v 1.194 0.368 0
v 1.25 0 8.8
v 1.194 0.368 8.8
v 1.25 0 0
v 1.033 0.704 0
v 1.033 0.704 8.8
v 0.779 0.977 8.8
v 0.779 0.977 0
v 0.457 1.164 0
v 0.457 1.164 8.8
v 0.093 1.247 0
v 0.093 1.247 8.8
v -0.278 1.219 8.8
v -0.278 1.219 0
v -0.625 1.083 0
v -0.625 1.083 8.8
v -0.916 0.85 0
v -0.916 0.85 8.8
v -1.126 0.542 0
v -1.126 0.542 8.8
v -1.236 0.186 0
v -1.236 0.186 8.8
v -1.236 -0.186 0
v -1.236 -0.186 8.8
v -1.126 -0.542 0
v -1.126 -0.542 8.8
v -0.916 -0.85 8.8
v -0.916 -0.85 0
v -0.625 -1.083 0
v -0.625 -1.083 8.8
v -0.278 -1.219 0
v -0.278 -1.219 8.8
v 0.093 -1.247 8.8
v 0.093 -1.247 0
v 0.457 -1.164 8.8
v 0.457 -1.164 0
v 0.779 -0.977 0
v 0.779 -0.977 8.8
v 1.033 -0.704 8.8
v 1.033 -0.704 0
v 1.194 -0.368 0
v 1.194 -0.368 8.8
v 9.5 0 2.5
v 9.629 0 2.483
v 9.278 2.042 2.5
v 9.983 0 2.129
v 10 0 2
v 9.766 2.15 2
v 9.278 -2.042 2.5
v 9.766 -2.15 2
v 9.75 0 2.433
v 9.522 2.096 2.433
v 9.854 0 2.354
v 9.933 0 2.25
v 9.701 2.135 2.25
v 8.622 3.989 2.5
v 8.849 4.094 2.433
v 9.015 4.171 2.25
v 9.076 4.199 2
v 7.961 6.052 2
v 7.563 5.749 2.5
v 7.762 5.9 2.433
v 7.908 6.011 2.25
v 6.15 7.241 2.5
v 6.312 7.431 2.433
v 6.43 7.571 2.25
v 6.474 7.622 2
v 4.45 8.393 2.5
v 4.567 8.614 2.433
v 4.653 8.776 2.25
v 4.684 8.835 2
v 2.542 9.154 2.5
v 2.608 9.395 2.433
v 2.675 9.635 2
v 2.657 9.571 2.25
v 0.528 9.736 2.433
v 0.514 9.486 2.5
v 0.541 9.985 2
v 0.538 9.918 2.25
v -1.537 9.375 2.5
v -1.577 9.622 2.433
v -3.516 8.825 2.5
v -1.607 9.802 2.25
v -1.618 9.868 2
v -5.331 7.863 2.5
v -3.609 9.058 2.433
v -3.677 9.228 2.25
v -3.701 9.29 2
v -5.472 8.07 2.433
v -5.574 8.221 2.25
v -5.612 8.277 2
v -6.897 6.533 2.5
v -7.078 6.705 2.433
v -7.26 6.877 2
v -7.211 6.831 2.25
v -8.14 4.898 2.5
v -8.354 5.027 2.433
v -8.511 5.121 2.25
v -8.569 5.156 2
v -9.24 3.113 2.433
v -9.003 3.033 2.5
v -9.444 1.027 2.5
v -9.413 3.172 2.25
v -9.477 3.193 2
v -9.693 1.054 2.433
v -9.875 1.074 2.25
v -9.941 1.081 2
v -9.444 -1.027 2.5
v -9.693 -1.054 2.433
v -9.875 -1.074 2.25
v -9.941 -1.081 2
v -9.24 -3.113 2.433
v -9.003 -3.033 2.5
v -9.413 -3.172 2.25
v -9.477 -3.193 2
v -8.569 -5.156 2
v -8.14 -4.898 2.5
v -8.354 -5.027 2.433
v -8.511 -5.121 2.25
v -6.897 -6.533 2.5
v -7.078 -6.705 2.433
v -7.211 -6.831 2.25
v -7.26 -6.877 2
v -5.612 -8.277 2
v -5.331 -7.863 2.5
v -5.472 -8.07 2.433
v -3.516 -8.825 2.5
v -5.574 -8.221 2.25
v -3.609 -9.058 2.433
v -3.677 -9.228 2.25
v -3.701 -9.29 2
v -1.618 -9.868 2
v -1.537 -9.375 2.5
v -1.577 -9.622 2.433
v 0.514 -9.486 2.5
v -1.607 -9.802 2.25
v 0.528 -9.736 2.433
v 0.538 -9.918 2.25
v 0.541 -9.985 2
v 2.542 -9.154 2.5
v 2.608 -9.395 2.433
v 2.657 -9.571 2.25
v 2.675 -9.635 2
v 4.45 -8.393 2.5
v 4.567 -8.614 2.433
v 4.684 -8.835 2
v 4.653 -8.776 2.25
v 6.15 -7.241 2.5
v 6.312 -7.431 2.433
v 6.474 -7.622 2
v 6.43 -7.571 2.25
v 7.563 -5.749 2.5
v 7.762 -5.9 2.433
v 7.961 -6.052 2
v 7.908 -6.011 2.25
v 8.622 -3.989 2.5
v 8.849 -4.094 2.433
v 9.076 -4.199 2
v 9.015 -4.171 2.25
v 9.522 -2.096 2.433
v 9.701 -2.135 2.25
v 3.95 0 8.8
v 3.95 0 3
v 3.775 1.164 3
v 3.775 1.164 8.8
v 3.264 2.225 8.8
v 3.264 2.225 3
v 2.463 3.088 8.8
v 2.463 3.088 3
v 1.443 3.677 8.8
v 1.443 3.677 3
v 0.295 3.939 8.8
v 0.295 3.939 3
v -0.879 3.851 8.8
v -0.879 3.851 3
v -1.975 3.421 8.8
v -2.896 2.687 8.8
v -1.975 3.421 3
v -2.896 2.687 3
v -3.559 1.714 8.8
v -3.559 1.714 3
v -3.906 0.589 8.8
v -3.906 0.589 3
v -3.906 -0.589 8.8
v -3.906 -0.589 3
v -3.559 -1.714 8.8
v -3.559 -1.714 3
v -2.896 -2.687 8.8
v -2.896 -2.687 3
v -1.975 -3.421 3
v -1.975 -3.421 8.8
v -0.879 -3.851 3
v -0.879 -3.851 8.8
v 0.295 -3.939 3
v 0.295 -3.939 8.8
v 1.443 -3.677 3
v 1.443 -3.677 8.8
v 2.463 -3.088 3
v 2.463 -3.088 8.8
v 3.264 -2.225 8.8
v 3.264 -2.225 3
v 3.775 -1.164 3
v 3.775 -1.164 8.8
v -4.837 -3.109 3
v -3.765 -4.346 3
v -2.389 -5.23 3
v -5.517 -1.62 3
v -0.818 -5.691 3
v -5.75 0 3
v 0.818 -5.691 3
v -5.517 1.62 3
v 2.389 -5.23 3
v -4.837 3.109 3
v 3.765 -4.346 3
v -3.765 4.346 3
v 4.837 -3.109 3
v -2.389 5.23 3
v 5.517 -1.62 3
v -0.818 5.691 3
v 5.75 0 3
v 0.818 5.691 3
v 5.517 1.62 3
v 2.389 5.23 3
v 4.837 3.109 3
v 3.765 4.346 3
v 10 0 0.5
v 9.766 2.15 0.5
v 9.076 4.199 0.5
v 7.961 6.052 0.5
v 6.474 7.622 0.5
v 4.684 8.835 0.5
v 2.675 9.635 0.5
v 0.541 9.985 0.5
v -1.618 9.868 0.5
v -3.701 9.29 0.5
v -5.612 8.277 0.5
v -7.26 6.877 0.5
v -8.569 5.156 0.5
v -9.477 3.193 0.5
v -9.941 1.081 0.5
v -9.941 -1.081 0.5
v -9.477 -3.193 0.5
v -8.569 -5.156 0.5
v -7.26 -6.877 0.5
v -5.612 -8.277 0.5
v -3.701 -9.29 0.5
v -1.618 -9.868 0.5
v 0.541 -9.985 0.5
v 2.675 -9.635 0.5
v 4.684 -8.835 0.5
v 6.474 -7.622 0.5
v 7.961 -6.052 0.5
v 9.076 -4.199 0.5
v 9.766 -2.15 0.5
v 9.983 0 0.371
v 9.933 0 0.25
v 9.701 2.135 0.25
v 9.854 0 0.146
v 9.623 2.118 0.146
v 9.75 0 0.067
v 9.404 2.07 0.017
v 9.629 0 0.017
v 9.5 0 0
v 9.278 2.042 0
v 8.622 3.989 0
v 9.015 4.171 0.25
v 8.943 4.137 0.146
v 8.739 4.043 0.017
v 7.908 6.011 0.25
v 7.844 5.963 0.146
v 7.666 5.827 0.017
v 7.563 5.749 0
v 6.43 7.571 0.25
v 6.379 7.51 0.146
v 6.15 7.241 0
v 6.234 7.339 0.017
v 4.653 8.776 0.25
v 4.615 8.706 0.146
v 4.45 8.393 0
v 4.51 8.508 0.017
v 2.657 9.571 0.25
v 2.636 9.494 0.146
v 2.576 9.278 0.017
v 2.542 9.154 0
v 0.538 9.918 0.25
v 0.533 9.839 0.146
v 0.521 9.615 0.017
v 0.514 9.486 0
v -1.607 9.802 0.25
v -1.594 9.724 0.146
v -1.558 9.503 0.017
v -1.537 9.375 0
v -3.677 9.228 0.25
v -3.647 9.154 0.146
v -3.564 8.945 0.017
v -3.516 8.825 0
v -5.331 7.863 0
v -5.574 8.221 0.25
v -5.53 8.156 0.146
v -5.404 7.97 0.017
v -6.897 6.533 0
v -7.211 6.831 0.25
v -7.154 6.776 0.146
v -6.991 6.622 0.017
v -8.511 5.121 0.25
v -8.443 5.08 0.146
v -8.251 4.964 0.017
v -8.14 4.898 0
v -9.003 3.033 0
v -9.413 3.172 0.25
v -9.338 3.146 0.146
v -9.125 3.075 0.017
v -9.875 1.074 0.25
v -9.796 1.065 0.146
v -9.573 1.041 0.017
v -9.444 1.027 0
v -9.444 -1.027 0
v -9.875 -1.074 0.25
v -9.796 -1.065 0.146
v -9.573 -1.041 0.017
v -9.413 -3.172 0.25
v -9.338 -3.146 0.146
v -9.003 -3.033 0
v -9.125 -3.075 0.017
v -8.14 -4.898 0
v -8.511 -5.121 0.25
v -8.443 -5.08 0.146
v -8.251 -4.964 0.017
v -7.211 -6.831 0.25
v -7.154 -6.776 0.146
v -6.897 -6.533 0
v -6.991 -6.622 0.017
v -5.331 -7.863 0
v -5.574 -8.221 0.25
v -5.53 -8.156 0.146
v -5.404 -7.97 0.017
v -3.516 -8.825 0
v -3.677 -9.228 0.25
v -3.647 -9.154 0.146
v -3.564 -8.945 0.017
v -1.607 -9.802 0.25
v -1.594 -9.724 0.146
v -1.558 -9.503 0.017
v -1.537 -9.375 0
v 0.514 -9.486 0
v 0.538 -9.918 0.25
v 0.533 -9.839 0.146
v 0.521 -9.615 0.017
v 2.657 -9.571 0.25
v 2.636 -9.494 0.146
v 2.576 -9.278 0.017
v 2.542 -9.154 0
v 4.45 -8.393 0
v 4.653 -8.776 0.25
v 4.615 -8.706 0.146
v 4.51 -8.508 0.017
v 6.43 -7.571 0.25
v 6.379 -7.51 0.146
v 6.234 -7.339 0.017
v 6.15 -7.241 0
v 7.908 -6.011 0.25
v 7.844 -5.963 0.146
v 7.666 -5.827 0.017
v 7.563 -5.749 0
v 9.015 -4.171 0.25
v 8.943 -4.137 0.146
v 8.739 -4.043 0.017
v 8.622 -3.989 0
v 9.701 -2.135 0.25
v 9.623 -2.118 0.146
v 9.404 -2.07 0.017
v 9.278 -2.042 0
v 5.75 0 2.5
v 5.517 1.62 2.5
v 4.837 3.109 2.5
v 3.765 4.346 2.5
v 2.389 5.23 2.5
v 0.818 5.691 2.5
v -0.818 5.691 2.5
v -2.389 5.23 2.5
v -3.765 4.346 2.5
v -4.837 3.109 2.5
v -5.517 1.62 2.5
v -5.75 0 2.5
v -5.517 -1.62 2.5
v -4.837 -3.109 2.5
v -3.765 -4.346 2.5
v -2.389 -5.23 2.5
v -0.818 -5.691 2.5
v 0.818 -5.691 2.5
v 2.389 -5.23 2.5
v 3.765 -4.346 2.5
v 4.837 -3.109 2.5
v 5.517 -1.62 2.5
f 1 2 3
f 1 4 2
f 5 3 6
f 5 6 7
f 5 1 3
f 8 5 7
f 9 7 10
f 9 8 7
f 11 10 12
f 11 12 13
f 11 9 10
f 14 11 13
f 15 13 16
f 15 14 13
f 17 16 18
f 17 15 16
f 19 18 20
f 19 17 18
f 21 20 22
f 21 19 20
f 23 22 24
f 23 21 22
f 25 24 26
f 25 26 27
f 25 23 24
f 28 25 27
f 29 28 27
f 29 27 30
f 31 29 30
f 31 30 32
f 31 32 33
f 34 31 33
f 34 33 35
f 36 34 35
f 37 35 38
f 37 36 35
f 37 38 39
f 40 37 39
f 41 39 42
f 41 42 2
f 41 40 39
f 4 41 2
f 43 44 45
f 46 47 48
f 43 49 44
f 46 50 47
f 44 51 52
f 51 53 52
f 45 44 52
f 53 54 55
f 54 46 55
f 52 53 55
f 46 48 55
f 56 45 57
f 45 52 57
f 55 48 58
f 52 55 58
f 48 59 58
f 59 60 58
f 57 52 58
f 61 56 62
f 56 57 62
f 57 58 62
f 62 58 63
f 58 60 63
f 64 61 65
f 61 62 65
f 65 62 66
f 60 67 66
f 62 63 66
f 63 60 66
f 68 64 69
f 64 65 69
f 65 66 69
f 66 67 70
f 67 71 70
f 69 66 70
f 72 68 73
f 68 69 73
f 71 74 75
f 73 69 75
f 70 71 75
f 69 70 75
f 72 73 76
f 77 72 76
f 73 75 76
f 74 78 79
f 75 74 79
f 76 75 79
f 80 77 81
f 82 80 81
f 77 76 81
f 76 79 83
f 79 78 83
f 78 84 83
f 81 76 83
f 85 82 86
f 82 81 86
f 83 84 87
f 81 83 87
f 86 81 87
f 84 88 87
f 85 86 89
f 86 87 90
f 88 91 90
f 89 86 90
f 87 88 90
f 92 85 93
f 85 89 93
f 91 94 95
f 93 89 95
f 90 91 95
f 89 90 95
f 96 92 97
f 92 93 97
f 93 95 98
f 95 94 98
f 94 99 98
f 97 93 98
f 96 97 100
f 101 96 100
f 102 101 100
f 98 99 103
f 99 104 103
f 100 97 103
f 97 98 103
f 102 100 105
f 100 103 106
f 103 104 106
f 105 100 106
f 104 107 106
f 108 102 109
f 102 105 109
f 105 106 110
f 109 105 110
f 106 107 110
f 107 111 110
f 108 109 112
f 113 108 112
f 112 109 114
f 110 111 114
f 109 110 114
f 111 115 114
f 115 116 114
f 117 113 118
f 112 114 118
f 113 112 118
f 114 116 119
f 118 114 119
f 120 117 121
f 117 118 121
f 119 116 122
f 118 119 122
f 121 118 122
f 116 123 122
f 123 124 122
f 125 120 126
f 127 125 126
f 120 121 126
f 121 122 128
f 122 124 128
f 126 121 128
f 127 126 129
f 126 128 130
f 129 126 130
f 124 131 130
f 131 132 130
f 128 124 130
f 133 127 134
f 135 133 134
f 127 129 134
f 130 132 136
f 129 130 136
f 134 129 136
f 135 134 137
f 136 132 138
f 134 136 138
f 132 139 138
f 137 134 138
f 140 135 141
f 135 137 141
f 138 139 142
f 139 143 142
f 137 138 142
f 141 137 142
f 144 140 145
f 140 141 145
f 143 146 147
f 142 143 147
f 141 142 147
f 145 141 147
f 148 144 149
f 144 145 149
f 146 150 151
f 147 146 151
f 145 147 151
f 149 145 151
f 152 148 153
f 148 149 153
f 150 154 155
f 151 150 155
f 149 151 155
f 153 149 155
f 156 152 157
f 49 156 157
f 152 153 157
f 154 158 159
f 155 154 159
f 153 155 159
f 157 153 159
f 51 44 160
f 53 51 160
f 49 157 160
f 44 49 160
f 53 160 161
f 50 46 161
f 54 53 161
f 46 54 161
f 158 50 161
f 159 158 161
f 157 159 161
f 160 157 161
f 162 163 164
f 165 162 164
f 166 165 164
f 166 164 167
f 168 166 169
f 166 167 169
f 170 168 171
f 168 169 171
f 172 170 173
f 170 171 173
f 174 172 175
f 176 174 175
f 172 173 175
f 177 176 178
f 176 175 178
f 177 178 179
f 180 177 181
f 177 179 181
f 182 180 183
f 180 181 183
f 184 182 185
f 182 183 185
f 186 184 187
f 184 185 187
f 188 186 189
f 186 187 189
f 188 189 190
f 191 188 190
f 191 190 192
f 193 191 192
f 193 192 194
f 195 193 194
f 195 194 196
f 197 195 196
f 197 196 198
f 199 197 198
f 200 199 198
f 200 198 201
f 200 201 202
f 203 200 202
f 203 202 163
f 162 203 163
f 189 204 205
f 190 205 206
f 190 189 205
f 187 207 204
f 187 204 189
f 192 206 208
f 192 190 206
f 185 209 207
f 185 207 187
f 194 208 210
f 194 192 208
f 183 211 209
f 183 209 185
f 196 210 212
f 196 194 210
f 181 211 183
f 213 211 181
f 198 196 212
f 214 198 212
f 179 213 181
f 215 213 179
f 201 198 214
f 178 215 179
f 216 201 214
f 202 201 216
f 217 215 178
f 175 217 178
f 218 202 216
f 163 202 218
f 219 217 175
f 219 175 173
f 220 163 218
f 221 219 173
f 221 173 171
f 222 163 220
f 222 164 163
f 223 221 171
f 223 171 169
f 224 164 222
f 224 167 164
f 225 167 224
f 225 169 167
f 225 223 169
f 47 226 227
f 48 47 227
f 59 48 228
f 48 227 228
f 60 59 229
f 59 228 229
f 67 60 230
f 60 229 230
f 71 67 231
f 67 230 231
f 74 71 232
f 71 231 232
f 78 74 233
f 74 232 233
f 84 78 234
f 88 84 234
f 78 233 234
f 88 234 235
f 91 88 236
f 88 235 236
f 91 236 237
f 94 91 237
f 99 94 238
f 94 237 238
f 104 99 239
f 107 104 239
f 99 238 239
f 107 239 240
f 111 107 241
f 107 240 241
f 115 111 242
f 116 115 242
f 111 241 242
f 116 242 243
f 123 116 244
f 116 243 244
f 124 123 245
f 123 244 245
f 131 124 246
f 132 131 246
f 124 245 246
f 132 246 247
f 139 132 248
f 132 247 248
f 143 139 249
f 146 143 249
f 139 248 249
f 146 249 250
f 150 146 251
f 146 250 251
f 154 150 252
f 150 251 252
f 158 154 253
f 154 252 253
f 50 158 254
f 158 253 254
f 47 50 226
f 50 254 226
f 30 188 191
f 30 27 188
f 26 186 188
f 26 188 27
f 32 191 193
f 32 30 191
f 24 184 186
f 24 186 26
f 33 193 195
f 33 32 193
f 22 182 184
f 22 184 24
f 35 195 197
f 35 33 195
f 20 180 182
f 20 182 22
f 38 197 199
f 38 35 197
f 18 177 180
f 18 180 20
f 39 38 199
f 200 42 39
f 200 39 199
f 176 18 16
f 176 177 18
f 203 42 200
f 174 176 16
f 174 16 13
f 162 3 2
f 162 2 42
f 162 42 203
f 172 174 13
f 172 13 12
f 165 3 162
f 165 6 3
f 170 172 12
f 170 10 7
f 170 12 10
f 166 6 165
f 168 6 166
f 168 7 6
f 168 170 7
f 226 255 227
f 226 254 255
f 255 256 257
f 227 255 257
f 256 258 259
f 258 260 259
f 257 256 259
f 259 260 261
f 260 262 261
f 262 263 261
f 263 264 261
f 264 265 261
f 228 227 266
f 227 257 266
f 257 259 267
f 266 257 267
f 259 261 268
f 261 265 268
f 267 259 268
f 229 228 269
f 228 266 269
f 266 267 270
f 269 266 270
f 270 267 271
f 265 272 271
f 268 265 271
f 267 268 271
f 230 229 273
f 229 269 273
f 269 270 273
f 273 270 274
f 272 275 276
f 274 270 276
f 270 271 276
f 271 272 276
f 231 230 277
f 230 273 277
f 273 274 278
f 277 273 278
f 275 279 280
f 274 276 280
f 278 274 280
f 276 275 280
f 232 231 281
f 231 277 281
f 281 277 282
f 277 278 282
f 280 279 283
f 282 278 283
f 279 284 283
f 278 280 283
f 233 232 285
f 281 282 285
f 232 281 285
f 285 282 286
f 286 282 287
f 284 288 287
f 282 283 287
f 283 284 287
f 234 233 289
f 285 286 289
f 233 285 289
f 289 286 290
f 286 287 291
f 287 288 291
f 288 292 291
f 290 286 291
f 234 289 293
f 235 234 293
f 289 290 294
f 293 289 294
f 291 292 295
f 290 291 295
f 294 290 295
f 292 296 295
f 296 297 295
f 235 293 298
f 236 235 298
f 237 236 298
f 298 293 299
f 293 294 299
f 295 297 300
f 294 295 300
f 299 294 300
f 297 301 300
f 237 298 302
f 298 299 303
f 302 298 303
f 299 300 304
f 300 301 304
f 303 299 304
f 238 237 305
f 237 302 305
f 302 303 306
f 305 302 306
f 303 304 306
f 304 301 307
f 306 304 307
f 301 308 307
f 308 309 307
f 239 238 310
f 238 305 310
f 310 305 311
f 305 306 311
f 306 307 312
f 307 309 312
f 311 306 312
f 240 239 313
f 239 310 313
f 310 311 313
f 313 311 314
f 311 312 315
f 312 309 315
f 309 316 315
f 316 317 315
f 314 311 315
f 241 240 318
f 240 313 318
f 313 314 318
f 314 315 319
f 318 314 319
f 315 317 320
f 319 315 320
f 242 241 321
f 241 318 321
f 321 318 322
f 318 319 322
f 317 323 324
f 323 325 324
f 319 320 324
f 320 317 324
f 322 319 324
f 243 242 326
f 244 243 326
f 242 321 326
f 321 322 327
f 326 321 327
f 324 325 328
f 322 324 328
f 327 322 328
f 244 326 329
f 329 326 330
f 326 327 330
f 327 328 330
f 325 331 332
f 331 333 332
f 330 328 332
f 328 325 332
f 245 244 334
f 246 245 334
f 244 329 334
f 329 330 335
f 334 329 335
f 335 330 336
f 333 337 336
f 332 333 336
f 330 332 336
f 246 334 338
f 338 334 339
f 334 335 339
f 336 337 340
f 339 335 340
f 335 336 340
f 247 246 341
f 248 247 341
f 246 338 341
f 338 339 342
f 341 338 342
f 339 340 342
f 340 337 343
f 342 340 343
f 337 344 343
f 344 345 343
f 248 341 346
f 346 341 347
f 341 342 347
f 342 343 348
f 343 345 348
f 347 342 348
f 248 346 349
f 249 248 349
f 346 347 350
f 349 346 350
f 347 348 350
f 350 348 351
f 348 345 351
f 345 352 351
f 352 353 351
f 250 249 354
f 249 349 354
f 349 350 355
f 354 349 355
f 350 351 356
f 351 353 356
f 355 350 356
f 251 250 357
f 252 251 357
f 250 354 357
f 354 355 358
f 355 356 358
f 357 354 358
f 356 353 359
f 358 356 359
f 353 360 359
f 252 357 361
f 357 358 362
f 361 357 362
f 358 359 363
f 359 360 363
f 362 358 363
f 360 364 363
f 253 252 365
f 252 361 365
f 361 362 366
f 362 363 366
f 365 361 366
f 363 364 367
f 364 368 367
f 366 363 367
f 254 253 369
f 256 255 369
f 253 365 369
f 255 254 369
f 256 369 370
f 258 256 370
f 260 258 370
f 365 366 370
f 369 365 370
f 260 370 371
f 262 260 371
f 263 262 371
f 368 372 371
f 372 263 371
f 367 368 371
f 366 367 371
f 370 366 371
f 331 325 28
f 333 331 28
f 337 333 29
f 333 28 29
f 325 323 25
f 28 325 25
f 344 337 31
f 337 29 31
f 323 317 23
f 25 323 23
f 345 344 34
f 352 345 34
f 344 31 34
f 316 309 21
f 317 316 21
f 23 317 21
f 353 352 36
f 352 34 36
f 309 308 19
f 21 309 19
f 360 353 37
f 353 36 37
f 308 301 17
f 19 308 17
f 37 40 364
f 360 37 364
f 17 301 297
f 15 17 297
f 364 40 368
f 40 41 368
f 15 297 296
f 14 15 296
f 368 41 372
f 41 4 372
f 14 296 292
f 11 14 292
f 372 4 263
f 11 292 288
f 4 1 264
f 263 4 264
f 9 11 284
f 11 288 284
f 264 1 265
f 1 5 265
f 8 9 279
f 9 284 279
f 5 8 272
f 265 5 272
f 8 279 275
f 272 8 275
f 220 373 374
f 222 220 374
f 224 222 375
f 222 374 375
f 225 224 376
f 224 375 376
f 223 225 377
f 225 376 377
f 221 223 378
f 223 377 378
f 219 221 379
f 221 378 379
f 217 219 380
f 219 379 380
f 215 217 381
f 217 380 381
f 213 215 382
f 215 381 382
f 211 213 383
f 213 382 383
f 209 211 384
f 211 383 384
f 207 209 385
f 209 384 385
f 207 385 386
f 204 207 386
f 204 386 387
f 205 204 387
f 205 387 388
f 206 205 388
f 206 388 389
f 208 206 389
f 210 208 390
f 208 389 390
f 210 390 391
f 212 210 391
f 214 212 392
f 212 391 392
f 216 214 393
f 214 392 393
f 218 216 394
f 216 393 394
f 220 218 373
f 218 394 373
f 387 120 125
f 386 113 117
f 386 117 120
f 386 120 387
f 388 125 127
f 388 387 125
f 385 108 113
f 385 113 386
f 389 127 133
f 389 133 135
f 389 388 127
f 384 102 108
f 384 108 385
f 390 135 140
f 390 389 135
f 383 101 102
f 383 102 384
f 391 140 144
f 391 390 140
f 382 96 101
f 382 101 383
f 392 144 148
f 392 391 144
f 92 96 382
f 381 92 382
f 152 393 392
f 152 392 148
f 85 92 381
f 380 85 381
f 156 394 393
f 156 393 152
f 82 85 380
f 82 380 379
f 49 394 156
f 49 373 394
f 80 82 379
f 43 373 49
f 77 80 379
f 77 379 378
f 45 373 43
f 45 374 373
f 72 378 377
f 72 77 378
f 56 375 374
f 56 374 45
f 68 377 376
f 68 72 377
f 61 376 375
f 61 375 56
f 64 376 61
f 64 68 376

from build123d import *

# Parameters (mm, degrees)
F0_R     = 10
F0_R_2   = 1.25
F1_DEPTH = 2.5
F2_R     = 3.95
F2_R_2   = 1.25
F3_DEPTH = 6.3
F2_R_3   = 5.75
F4_DEPTH = 0.5
F5_R     = 0.5


with BuildPart() as f1:
    # F0 (on Top) → F1 (new body)
    with BuildSketch(Plane.XY):
        Circle(F0_R)
        Circle(F0_R_2, mode=Mode.SUBTRACT)
    extrude(amount=F1_DEPTH)

    # F2 (on face) → F3 (join)
    with BuildSketch(Plane.XY.offset(2.5)):
        Circle(F2_R)
        Circle(F2_R_2, mode=Mode.SUBTRACT)
    extrude(amount=F3_DEPTH)

    # F2 (on face) → F4 (join)
    with BuildSketch(Plane.XY.offset(2.5)):
        Circle(F2_R_3)
        Circle(F2_R, mode=Mode.SUBTRACT)
    extrude(amount=F4_DEPTH)

    # F5
    f5_edges = [f1.edges().sort_by_distance(p)[0] for p in [
        (-10, 0, 0),
        (-10, 0, 2.5),
    ]]
    fillet(f5_edges, radius=F5_R)


solid = f1.part
